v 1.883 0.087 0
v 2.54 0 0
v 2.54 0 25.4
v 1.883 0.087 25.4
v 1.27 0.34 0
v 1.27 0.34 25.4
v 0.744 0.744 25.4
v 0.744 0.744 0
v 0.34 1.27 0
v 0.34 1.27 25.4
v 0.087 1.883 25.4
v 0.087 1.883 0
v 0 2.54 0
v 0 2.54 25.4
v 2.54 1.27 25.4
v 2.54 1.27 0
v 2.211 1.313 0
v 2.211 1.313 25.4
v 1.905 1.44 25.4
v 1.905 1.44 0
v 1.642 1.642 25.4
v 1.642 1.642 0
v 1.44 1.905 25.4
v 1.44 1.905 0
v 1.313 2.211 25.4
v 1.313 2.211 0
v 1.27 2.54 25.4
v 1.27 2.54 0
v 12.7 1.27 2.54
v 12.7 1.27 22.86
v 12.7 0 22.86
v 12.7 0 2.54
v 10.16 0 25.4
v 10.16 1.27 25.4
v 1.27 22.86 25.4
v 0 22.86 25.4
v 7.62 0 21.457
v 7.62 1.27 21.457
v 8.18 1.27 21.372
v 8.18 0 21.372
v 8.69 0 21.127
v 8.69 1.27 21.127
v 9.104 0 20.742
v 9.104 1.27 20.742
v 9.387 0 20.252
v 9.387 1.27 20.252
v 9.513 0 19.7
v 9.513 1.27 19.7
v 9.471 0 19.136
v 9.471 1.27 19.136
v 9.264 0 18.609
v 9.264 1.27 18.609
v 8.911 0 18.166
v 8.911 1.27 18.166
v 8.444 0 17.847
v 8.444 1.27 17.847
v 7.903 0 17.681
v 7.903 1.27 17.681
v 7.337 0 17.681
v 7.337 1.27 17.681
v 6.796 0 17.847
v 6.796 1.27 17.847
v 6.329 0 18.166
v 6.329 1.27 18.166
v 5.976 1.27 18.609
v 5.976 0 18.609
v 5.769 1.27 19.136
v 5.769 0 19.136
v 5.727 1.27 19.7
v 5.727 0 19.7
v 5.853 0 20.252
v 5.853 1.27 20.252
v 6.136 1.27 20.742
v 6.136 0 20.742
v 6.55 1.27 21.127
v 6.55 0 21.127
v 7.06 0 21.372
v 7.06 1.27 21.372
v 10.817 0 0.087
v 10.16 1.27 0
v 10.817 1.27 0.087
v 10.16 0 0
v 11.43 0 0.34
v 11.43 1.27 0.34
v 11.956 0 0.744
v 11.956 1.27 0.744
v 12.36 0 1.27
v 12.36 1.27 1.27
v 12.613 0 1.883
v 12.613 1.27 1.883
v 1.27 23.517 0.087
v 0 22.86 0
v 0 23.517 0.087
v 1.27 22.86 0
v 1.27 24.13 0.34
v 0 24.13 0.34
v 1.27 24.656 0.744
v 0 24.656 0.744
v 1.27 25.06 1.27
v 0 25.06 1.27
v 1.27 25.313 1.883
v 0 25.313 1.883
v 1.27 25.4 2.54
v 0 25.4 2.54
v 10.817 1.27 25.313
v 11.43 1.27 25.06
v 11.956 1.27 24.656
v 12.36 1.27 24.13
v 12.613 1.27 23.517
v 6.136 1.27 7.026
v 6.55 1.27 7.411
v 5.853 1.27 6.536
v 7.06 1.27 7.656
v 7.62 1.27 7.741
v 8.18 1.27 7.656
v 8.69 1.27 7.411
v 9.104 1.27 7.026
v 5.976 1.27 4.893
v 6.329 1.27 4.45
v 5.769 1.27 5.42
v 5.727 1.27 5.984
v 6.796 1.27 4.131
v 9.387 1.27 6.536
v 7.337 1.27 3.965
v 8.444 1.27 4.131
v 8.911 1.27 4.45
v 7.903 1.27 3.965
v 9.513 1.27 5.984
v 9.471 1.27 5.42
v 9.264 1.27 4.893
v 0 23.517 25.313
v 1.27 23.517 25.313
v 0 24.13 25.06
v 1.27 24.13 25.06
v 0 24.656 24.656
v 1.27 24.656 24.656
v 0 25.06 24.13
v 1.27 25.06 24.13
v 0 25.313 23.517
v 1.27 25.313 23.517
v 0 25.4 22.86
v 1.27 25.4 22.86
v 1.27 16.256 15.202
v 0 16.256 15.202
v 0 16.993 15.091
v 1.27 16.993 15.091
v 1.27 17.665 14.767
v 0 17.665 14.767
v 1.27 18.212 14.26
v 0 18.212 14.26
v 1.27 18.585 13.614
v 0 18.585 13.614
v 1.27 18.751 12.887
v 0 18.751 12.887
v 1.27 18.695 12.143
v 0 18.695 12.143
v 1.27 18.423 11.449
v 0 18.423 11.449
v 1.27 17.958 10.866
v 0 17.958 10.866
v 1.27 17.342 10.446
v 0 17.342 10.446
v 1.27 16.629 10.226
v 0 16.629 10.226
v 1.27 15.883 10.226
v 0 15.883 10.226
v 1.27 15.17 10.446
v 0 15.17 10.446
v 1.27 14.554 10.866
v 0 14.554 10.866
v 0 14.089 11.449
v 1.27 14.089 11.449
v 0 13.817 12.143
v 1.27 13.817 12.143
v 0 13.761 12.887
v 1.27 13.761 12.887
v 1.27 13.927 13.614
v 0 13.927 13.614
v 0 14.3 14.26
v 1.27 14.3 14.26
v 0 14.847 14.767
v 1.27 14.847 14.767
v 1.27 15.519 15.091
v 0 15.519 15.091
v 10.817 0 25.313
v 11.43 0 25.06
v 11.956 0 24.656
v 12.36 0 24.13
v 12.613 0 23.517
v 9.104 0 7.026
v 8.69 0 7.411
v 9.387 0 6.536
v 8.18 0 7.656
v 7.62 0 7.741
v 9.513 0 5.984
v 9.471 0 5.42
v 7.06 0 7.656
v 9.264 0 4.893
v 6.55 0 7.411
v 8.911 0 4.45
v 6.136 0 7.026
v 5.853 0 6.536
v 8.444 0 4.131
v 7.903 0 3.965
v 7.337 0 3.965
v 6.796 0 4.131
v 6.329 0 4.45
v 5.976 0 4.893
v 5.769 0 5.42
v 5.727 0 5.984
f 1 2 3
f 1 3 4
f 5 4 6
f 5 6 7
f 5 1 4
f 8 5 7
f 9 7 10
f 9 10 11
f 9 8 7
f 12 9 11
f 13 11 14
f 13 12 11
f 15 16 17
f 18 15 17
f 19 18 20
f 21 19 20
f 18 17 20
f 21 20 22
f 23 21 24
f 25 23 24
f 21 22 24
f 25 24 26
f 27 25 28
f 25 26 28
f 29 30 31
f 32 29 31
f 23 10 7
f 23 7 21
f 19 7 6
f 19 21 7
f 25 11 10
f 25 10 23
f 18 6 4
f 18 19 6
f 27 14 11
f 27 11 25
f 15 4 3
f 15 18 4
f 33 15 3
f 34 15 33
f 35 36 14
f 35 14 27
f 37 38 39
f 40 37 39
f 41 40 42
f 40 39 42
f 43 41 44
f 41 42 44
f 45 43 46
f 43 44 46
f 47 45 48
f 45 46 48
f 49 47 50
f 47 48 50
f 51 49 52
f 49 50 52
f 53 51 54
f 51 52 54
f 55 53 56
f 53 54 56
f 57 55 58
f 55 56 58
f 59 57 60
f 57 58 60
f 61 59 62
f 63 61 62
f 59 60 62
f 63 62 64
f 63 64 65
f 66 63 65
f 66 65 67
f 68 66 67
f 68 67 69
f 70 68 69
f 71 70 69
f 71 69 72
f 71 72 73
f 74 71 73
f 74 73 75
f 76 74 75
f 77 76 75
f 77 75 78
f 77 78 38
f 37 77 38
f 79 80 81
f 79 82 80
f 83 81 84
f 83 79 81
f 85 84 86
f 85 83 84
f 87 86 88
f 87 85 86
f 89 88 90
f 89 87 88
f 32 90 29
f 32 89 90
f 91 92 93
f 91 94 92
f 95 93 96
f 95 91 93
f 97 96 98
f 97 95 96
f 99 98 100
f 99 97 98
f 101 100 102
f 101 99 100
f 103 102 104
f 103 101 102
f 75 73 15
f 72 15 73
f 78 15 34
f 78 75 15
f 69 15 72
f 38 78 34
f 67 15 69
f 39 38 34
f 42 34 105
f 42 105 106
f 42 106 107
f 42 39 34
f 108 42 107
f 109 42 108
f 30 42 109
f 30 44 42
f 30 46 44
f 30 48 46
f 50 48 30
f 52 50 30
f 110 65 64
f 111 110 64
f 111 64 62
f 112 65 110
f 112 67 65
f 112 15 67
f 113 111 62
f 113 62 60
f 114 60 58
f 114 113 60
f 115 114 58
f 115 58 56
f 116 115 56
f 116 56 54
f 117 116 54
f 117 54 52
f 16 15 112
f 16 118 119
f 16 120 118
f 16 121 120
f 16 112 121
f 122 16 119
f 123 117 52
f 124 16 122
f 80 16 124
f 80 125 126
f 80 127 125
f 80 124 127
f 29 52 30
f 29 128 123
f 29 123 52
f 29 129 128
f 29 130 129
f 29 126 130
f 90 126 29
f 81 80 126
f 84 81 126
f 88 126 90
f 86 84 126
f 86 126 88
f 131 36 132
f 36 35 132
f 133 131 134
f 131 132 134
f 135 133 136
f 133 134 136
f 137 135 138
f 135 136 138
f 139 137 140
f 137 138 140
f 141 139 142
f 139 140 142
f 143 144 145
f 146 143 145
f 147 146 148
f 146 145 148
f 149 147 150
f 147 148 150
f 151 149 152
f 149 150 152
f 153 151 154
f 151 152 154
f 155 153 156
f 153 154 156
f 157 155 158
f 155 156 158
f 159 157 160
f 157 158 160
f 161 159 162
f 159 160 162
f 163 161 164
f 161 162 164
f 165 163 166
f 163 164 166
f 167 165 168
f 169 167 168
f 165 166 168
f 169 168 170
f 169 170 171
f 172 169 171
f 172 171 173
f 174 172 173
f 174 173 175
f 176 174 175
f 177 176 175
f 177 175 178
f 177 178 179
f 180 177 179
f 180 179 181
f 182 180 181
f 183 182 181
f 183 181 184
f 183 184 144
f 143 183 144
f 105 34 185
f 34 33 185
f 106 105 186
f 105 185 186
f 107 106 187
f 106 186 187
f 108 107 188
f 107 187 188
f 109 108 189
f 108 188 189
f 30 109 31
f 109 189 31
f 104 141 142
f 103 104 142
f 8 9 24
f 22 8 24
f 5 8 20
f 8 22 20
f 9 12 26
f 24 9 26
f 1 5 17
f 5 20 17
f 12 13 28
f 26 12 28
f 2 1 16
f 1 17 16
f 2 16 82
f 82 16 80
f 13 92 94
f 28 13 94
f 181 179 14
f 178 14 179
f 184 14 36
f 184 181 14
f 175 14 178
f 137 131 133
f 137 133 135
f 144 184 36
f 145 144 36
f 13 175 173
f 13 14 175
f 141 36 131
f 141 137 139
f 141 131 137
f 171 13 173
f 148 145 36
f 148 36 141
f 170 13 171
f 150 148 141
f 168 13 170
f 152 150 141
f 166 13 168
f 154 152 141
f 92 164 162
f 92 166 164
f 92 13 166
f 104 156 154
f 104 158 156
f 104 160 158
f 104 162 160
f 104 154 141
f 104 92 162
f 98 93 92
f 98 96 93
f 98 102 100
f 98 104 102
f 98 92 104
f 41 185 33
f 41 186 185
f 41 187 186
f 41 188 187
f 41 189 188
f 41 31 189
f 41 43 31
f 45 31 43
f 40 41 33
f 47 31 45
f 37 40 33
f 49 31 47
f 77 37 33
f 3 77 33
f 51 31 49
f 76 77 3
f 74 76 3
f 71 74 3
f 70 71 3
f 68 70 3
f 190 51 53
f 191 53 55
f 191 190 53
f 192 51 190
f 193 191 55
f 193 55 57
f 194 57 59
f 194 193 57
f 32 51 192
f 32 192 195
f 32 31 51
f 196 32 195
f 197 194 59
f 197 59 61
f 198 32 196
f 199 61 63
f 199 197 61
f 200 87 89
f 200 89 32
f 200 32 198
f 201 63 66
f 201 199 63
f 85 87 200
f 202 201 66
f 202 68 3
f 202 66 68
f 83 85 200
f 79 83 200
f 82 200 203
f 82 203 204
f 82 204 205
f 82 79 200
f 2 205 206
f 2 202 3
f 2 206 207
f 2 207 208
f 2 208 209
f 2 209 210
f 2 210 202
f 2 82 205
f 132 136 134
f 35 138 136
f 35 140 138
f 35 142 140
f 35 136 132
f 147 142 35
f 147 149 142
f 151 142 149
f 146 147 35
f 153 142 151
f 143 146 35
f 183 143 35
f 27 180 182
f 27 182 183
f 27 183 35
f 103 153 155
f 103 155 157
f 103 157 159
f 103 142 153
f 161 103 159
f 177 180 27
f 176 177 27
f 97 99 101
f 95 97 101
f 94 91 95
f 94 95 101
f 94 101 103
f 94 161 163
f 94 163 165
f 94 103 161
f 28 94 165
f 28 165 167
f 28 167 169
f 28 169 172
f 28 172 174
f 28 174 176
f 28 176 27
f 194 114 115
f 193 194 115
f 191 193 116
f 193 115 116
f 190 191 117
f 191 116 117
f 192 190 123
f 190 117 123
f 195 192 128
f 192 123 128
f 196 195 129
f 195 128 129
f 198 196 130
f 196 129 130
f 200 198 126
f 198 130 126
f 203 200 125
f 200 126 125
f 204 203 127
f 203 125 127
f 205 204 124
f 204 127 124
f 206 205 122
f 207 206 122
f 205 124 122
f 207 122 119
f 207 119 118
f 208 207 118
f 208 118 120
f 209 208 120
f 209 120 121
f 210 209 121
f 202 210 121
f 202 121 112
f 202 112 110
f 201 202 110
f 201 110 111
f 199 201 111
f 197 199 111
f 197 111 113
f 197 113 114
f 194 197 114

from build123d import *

# Parameters (mm, degrees)
BOSS_EXTRUDE1_DEPTH    = 25.4
CONVERT_SOLID1_DEPTH   = 25.4
CONVERT_SOLID1_2_DEPTH = 25.4
SKETCH7_R              = 2.5019
CUT_EXTRUDE1_DEPTH     = 39.1
FILLET1_R              = 2.54
SKETCH8_R              = 1.89865
CUT_EXTRUDE2_DEPTH     = 38.265357908


# Read off the part's stored shape, not the designer's step: Convert-Solid1
with BuildPart() as part:
    # Sketch2 → Boss-Extrude1 (new body)
    with BuildSketch(Plane.XY):
        Polygon((0, 0), (0, 25.4), (1.27, 25.4), (1.27, 1.27), (12.7, 1.27), (12.7, 0), align=None)
    extrude(amount=BOSS_EXTRUDE1_DEPTH)

    # Convert-Solid1 outline → Convert-Solid1 (cut)
    with BuildSketch(Plane.XY):
        with BuildLine():
            ThreePointArc((2.54, 0), (0.743948776, 0.743948776), (0, 2.54))
            Line((0, 2.54), (0, 0))
            Line((0, 0), (2.54, 0))
        make_face()
    extrude(amount=CONVERT_SOLID1_DEPTH, mode=Mode.SUBTRACT)

    # Convert-Solid1 2 outline → Convert-Solid1 2 (add)
    with BuildSketch(Plane.XY):
        with BuildLine():
            ThreePointArc((2.54, 1.27), (1.641974388, 1.641974388), (1.27, 2.54))
            Line((1.27, 2.54), (1.27, 1.27))
            Line((1.27, 1.27), (2.54, 1.27))
        make_face()
    extrude(amount=CONVERT_SOLID1_2_DEPTH)

    # Sketch7 → Cut-Extrude1 (cut, through all)
    with BuildSketch(Plane.ZY):
        with Locations((12.7, 16.256)):
            Circle(SKETCH7_R)
    extrude(amount=-CUT_EXTRUDE1_DEPTH, mode=Mode.SUBTRACT)

    # Fillet1
    fillet1_edges = [part.edges().sort_by_distance(p)[0] for p in [
        (12.7, 0.635, 0),
        (12.7, 0.635, 25.4),
        (0.635, 25.4, 25.4),
        (0.635, 25.4, 0),
    ]]
    fillet(fillet1_edges, radius=FILLET1_R)

    # Sketch8 → Cut-Extrude2 (cut, through all)
    with BuildSketch(Plane(origin=(0, 1.27, 0), x_dir=(1, 0, 0), z_dir=(0, 1, 0))):
        with Locations(Location((7.62, -5.842, 0), (0, 0, 270))):
            Circle(SKETCH8_R)
        with Locations(Location((7.62, -19.558, 0), (0, 0, 270))):
            Circle(SKETCH8_R)
    extrude(amount=-CUT_EXTRUDE2_DEPTH, mode=Mode.SUBTRACT)


solid = part.part
